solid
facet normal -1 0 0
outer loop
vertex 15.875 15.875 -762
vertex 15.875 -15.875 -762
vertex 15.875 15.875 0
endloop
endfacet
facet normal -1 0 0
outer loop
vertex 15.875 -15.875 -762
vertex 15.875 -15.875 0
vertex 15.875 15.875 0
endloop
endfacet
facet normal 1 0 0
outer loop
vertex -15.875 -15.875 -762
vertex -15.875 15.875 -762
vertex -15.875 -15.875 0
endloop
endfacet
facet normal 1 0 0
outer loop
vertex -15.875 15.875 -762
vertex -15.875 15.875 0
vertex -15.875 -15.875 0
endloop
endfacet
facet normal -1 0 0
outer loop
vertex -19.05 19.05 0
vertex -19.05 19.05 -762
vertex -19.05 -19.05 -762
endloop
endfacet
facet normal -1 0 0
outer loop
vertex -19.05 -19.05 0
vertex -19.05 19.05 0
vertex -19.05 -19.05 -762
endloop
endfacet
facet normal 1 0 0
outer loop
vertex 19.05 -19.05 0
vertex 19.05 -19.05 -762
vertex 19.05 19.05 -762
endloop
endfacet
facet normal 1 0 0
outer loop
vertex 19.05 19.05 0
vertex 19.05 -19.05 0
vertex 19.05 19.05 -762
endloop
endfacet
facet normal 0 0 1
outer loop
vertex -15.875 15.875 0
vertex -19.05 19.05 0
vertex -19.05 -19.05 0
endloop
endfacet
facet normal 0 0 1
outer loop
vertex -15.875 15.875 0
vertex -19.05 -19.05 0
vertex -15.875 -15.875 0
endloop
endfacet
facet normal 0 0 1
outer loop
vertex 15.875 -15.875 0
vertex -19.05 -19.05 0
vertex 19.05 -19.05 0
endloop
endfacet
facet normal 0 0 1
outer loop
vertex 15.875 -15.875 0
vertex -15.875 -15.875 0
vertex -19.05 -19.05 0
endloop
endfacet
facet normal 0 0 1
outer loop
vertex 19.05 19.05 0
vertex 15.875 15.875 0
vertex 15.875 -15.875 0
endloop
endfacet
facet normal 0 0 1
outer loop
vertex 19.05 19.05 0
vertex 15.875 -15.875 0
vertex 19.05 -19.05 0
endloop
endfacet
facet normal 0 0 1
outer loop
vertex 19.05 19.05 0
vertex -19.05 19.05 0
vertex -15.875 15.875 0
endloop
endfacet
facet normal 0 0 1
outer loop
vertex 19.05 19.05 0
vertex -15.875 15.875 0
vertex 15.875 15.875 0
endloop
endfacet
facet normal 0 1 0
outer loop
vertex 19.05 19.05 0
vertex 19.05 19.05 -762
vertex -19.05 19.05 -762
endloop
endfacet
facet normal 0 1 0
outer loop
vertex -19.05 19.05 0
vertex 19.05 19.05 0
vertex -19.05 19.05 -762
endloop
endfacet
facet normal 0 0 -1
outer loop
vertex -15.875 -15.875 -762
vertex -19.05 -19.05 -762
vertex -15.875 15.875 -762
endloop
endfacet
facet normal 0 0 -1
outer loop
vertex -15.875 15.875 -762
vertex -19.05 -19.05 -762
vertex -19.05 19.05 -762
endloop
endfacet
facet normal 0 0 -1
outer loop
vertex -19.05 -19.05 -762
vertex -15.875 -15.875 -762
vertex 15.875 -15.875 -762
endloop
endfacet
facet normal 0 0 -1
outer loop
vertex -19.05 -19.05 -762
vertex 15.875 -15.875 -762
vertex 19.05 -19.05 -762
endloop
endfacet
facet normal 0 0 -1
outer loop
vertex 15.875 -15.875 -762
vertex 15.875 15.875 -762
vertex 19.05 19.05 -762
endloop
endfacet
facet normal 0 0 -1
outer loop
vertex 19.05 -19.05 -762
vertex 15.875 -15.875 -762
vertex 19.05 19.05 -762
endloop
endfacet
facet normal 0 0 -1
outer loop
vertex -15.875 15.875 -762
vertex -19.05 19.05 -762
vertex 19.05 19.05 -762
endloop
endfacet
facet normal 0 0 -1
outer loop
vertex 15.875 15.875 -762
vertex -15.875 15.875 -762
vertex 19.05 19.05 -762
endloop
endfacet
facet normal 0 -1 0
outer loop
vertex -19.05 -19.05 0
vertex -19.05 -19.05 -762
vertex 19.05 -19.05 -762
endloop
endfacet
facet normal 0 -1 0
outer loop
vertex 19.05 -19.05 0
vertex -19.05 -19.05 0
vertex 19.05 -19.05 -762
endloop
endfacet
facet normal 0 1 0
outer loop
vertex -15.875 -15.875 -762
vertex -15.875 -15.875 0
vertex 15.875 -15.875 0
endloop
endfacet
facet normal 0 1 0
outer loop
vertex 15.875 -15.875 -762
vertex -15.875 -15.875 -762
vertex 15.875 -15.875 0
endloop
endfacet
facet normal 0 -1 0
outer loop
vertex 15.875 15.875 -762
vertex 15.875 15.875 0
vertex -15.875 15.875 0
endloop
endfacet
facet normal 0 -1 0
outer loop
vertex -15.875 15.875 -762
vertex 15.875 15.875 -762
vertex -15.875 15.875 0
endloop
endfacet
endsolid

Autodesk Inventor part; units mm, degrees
ref_plane "XZ Plane" through (0, 0, 0) normal (0, 1, 0) x (-1, 0, 0)
ref_plane "XY Plane" through (0, 0, 0) normal (0, 0, 1) x (1, 0, 0)
sketch "Sketch1" plane through (0, 0, 0) normal (0, 0, 1) x (1, 0, 0)
  line L0 (-19.05, -19.05) -> (19.05, -19.05)
  line L1 (19.05, -19.05) -> (19.05, 19.05)
  line L2 (19.05, 19.05) -> (-19.05, 19.05)
  line L3 (-19.05, 19.05) -> (-19.05, -19.05)
  line L4 (-19.05, -19.05) -> (19.05, 19.05) construction
  line L5 (19.05, -19.05) -> (-19.05, 19.05) construction
  line L6 (-15.875, -15.875) -> (15.875, -15.875)
  line L7 (15.875, -15.875) -> (15.875, 15.875)
  line L8 (15.875, 15.875) -> (-15.875, 15.875)
  line L9 (-15.875, 15.875) -> (-15.875, -15.875)
  line L10 (-15.875, -15.875) -> (15.875, 15.875) construction
  line L11 (15.875, -15.875) -> (-15.875, 15.875) construction
  point P0 (0, 0)
  dimension "d0" = 38.1
  dimension "d1" = 3.175
extrude "Extrusion1" add sketch "Sketch1" against normal blind 762
properties part number "1_5inSquareArmTube"
